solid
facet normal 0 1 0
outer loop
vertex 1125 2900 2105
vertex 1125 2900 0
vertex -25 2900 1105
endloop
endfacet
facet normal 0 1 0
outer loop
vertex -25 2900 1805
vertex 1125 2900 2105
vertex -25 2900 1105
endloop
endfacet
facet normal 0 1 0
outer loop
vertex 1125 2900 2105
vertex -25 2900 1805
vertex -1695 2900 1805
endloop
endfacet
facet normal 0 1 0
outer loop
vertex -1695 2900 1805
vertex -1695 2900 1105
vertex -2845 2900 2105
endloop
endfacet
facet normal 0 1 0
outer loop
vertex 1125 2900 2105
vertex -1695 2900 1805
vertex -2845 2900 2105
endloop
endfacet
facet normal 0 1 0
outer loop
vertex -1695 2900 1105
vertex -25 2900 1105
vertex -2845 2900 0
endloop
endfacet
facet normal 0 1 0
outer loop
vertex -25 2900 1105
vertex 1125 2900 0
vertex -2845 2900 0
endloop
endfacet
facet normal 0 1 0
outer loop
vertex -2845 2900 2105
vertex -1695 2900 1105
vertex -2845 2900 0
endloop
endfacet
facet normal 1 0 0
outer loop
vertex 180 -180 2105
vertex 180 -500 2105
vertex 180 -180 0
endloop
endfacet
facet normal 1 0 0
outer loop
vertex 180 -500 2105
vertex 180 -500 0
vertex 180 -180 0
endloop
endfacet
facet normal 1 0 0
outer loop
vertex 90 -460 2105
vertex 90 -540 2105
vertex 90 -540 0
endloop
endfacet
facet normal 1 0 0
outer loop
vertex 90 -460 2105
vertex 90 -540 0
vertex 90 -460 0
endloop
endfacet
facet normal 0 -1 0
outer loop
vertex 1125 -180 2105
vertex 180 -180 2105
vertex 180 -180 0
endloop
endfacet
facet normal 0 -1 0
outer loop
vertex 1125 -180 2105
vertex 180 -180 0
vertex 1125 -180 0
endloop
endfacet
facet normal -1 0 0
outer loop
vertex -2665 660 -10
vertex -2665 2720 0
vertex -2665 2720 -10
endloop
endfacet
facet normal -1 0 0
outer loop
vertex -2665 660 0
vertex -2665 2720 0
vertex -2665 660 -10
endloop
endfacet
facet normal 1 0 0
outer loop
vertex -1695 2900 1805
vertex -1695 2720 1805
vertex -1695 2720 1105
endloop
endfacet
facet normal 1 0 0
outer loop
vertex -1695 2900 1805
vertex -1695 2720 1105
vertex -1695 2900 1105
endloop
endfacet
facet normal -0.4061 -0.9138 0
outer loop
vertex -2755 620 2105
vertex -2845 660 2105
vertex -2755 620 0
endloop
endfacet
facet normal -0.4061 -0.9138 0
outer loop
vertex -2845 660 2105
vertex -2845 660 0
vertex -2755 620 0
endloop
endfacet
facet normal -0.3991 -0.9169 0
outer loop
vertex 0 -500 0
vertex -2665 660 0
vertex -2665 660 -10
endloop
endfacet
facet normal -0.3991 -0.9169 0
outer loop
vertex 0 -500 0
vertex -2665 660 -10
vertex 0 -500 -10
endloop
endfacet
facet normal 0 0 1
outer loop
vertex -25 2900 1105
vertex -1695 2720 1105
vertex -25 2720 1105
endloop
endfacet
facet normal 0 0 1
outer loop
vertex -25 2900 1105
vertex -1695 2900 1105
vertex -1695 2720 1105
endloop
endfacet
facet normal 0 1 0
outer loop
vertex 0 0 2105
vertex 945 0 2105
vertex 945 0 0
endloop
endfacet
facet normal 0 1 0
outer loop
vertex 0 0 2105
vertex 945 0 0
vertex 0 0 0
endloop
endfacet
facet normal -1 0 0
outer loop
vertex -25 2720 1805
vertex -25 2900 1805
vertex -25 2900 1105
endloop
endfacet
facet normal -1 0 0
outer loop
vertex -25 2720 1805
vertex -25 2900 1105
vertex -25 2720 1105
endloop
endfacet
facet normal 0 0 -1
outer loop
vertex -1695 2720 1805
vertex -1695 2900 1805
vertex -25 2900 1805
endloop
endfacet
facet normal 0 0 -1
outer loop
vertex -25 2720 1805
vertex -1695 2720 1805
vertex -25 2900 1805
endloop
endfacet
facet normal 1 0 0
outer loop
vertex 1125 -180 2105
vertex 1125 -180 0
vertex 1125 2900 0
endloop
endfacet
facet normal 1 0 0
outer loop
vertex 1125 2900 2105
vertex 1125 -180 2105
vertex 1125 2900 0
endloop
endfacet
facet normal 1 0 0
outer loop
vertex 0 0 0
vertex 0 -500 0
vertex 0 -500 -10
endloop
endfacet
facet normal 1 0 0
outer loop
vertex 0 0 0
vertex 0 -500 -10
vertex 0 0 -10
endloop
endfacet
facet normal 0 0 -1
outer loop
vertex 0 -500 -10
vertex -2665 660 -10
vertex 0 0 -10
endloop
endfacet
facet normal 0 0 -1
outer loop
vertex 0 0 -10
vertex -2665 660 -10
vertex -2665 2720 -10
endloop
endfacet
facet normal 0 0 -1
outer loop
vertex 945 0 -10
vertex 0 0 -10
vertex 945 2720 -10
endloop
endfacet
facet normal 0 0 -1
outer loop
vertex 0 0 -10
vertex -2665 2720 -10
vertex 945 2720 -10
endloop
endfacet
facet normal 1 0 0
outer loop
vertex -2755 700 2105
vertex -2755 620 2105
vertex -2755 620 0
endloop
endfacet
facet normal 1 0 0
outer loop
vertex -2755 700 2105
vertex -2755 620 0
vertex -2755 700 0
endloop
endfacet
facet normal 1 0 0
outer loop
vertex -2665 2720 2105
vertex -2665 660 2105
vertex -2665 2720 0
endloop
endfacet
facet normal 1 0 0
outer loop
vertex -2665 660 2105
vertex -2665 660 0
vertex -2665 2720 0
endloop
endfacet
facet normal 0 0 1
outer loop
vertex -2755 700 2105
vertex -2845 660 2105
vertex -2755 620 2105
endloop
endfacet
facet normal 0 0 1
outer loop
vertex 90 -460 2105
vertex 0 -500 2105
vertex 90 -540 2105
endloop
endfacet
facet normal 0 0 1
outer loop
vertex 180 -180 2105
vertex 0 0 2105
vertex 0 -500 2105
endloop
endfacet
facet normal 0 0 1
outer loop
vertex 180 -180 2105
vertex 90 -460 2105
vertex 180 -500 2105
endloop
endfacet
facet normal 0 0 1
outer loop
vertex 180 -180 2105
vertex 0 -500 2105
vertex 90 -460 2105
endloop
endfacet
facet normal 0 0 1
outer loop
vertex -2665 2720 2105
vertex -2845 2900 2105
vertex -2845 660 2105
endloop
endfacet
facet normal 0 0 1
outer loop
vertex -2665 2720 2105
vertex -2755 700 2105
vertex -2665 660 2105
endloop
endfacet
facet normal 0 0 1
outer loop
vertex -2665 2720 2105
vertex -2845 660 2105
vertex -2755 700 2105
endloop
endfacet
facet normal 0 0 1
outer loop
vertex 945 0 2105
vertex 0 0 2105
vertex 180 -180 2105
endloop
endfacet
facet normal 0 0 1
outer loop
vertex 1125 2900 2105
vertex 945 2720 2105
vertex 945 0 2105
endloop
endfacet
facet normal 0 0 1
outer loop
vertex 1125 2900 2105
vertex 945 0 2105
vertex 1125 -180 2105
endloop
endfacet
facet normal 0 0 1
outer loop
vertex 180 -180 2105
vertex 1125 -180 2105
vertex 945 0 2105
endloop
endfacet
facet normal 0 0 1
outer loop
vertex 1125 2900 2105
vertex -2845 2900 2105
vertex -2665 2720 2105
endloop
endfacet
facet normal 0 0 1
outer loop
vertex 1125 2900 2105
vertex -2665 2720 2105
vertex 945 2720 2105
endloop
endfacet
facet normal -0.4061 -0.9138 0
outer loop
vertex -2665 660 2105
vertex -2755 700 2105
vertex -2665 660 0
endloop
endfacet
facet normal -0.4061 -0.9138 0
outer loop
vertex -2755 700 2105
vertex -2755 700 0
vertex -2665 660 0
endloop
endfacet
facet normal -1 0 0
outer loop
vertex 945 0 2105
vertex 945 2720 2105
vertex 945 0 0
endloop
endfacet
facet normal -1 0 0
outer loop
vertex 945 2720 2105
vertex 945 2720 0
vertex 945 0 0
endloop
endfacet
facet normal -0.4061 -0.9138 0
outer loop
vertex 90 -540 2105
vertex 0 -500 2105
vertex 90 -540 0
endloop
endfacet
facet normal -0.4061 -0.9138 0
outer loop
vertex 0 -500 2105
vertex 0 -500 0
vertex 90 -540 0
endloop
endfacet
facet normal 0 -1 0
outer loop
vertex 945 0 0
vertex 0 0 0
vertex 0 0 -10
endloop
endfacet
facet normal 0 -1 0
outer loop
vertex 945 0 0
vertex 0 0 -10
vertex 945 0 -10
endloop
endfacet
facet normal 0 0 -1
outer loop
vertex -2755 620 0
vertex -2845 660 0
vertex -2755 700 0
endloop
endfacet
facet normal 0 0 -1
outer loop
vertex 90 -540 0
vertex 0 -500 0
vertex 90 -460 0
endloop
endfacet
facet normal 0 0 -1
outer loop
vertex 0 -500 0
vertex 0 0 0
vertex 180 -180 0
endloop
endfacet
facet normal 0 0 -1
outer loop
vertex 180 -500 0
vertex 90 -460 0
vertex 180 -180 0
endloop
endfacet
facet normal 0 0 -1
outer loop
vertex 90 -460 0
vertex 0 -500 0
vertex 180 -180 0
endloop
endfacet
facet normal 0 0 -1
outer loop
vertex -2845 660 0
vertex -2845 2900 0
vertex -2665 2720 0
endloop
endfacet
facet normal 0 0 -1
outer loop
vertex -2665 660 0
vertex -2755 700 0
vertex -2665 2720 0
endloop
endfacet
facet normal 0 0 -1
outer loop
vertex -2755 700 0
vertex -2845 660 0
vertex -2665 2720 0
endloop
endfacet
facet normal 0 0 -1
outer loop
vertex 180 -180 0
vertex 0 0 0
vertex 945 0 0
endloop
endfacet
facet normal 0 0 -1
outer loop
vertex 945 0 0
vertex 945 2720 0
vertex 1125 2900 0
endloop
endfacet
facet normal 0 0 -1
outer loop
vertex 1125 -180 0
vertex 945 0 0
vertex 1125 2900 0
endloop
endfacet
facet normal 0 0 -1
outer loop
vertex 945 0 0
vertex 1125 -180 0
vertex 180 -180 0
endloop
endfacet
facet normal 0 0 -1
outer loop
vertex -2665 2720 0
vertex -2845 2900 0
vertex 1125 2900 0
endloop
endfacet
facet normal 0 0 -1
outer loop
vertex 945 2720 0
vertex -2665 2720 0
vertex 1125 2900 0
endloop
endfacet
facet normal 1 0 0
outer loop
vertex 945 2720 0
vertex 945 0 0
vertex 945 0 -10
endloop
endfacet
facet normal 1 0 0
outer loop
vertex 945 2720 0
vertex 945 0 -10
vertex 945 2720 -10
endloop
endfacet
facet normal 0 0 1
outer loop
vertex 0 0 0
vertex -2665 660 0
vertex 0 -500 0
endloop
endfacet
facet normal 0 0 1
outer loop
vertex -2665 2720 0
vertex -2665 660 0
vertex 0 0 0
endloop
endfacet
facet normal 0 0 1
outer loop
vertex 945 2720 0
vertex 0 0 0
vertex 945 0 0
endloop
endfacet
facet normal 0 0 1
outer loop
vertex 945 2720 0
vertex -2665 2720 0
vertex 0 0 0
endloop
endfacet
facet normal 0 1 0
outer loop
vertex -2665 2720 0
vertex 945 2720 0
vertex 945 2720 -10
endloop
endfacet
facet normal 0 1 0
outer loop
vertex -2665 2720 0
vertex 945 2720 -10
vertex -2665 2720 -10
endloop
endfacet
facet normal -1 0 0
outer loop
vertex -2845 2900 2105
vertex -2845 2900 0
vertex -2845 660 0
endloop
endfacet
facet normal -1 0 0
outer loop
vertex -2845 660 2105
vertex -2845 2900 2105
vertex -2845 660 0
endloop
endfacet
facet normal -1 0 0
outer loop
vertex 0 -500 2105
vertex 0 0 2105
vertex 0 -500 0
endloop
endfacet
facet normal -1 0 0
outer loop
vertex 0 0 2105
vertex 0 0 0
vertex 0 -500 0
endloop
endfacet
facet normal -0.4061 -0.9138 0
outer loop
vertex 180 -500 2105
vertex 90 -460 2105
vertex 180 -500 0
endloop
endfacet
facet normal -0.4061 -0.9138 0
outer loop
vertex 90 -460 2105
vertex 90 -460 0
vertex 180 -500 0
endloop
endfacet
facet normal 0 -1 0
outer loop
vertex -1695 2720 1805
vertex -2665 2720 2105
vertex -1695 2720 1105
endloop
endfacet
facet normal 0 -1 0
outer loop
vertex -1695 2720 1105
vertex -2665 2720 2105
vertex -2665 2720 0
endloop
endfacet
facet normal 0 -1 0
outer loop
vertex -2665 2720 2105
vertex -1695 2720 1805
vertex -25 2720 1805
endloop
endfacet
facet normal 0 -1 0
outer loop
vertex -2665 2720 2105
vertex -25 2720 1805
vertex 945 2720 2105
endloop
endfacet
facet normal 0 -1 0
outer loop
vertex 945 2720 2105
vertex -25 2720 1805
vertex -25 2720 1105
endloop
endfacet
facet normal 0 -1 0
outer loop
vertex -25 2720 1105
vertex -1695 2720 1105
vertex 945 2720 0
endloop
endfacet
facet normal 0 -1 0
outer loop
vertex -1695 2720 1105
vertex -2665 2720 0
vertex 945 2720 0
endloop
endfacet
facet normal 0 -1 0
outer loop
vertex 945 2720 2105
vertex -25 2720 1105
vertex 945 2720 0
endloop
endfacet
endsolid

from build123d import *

# Parameters (mm, degrees)
F1_DEPTH = 1105
F3_DEPTH = 700
F5_DEPTH = 300
F7_DEPTH = 10


with BuildPart() as f1:
    # F0 (on Top) → F1 (new body)
    with BuildSketch(Plane.XY):
        Polygon((945, 0), (0, 0), (0, -500), (90, -540), (90, -460), (180, -500), (180, -180), (1125, -180), (1125, 2900), (-2845, 2900), (-2845, 660), (-2755, 620), (-2755, 700), (-2665, 660), (-2665, 2720), (945, 2720), align=None)
    extrude(amount=F1_DEPTH)

    # F2 (on face) → F3 (join)
    with BuildSketch(Plane.XY.offset(1105)):
        Polygon((-2665, 2720), (-1695, 2720), (-1695, 2900), (-2845, 2900), (-2845, 660), (-2755, 620), (-2755, 700), (-2665, 660), align=None)
        Polygon((0, 0), (0, -500), (90, -540), (90, -460), (180, -500), (180, -180), (1125, -180), (1125, 2900), (-25, 2900), (-25, 2720), (945, 2720), (945, 0), align=None)
    extrude(amount=F3_DEPTH)

    # F4 (on face) → F5 (join)
    with BuildSketch(Plane.XY.offset(1805)):
        Polygon((-2845, 2900), (-2845, 660), (-2755, 620), (-2755, 700), (-2665, 660), (-2665, 2720), (945, 2720), (945, 0), (0, 0), (0, -500), (90, -540), (90, -460), (180, -500), (180, -180), (1125, -180), (1125, 2900), align=None)
    extrude(amount=F5_DEPTH)


with BuildPart() as f7:
    # F6 (on Top) → F7 (new body)
    with BuildSketch(Plane.XY):
        Polygon((0, -500), (0, 0), (945, 0), (945, 2720), (-2665, 2720), (-2665, 660), align=None)
    extrude(amount=-F7_DEPTH)


solid = Compound([f1.part, f7.part])
